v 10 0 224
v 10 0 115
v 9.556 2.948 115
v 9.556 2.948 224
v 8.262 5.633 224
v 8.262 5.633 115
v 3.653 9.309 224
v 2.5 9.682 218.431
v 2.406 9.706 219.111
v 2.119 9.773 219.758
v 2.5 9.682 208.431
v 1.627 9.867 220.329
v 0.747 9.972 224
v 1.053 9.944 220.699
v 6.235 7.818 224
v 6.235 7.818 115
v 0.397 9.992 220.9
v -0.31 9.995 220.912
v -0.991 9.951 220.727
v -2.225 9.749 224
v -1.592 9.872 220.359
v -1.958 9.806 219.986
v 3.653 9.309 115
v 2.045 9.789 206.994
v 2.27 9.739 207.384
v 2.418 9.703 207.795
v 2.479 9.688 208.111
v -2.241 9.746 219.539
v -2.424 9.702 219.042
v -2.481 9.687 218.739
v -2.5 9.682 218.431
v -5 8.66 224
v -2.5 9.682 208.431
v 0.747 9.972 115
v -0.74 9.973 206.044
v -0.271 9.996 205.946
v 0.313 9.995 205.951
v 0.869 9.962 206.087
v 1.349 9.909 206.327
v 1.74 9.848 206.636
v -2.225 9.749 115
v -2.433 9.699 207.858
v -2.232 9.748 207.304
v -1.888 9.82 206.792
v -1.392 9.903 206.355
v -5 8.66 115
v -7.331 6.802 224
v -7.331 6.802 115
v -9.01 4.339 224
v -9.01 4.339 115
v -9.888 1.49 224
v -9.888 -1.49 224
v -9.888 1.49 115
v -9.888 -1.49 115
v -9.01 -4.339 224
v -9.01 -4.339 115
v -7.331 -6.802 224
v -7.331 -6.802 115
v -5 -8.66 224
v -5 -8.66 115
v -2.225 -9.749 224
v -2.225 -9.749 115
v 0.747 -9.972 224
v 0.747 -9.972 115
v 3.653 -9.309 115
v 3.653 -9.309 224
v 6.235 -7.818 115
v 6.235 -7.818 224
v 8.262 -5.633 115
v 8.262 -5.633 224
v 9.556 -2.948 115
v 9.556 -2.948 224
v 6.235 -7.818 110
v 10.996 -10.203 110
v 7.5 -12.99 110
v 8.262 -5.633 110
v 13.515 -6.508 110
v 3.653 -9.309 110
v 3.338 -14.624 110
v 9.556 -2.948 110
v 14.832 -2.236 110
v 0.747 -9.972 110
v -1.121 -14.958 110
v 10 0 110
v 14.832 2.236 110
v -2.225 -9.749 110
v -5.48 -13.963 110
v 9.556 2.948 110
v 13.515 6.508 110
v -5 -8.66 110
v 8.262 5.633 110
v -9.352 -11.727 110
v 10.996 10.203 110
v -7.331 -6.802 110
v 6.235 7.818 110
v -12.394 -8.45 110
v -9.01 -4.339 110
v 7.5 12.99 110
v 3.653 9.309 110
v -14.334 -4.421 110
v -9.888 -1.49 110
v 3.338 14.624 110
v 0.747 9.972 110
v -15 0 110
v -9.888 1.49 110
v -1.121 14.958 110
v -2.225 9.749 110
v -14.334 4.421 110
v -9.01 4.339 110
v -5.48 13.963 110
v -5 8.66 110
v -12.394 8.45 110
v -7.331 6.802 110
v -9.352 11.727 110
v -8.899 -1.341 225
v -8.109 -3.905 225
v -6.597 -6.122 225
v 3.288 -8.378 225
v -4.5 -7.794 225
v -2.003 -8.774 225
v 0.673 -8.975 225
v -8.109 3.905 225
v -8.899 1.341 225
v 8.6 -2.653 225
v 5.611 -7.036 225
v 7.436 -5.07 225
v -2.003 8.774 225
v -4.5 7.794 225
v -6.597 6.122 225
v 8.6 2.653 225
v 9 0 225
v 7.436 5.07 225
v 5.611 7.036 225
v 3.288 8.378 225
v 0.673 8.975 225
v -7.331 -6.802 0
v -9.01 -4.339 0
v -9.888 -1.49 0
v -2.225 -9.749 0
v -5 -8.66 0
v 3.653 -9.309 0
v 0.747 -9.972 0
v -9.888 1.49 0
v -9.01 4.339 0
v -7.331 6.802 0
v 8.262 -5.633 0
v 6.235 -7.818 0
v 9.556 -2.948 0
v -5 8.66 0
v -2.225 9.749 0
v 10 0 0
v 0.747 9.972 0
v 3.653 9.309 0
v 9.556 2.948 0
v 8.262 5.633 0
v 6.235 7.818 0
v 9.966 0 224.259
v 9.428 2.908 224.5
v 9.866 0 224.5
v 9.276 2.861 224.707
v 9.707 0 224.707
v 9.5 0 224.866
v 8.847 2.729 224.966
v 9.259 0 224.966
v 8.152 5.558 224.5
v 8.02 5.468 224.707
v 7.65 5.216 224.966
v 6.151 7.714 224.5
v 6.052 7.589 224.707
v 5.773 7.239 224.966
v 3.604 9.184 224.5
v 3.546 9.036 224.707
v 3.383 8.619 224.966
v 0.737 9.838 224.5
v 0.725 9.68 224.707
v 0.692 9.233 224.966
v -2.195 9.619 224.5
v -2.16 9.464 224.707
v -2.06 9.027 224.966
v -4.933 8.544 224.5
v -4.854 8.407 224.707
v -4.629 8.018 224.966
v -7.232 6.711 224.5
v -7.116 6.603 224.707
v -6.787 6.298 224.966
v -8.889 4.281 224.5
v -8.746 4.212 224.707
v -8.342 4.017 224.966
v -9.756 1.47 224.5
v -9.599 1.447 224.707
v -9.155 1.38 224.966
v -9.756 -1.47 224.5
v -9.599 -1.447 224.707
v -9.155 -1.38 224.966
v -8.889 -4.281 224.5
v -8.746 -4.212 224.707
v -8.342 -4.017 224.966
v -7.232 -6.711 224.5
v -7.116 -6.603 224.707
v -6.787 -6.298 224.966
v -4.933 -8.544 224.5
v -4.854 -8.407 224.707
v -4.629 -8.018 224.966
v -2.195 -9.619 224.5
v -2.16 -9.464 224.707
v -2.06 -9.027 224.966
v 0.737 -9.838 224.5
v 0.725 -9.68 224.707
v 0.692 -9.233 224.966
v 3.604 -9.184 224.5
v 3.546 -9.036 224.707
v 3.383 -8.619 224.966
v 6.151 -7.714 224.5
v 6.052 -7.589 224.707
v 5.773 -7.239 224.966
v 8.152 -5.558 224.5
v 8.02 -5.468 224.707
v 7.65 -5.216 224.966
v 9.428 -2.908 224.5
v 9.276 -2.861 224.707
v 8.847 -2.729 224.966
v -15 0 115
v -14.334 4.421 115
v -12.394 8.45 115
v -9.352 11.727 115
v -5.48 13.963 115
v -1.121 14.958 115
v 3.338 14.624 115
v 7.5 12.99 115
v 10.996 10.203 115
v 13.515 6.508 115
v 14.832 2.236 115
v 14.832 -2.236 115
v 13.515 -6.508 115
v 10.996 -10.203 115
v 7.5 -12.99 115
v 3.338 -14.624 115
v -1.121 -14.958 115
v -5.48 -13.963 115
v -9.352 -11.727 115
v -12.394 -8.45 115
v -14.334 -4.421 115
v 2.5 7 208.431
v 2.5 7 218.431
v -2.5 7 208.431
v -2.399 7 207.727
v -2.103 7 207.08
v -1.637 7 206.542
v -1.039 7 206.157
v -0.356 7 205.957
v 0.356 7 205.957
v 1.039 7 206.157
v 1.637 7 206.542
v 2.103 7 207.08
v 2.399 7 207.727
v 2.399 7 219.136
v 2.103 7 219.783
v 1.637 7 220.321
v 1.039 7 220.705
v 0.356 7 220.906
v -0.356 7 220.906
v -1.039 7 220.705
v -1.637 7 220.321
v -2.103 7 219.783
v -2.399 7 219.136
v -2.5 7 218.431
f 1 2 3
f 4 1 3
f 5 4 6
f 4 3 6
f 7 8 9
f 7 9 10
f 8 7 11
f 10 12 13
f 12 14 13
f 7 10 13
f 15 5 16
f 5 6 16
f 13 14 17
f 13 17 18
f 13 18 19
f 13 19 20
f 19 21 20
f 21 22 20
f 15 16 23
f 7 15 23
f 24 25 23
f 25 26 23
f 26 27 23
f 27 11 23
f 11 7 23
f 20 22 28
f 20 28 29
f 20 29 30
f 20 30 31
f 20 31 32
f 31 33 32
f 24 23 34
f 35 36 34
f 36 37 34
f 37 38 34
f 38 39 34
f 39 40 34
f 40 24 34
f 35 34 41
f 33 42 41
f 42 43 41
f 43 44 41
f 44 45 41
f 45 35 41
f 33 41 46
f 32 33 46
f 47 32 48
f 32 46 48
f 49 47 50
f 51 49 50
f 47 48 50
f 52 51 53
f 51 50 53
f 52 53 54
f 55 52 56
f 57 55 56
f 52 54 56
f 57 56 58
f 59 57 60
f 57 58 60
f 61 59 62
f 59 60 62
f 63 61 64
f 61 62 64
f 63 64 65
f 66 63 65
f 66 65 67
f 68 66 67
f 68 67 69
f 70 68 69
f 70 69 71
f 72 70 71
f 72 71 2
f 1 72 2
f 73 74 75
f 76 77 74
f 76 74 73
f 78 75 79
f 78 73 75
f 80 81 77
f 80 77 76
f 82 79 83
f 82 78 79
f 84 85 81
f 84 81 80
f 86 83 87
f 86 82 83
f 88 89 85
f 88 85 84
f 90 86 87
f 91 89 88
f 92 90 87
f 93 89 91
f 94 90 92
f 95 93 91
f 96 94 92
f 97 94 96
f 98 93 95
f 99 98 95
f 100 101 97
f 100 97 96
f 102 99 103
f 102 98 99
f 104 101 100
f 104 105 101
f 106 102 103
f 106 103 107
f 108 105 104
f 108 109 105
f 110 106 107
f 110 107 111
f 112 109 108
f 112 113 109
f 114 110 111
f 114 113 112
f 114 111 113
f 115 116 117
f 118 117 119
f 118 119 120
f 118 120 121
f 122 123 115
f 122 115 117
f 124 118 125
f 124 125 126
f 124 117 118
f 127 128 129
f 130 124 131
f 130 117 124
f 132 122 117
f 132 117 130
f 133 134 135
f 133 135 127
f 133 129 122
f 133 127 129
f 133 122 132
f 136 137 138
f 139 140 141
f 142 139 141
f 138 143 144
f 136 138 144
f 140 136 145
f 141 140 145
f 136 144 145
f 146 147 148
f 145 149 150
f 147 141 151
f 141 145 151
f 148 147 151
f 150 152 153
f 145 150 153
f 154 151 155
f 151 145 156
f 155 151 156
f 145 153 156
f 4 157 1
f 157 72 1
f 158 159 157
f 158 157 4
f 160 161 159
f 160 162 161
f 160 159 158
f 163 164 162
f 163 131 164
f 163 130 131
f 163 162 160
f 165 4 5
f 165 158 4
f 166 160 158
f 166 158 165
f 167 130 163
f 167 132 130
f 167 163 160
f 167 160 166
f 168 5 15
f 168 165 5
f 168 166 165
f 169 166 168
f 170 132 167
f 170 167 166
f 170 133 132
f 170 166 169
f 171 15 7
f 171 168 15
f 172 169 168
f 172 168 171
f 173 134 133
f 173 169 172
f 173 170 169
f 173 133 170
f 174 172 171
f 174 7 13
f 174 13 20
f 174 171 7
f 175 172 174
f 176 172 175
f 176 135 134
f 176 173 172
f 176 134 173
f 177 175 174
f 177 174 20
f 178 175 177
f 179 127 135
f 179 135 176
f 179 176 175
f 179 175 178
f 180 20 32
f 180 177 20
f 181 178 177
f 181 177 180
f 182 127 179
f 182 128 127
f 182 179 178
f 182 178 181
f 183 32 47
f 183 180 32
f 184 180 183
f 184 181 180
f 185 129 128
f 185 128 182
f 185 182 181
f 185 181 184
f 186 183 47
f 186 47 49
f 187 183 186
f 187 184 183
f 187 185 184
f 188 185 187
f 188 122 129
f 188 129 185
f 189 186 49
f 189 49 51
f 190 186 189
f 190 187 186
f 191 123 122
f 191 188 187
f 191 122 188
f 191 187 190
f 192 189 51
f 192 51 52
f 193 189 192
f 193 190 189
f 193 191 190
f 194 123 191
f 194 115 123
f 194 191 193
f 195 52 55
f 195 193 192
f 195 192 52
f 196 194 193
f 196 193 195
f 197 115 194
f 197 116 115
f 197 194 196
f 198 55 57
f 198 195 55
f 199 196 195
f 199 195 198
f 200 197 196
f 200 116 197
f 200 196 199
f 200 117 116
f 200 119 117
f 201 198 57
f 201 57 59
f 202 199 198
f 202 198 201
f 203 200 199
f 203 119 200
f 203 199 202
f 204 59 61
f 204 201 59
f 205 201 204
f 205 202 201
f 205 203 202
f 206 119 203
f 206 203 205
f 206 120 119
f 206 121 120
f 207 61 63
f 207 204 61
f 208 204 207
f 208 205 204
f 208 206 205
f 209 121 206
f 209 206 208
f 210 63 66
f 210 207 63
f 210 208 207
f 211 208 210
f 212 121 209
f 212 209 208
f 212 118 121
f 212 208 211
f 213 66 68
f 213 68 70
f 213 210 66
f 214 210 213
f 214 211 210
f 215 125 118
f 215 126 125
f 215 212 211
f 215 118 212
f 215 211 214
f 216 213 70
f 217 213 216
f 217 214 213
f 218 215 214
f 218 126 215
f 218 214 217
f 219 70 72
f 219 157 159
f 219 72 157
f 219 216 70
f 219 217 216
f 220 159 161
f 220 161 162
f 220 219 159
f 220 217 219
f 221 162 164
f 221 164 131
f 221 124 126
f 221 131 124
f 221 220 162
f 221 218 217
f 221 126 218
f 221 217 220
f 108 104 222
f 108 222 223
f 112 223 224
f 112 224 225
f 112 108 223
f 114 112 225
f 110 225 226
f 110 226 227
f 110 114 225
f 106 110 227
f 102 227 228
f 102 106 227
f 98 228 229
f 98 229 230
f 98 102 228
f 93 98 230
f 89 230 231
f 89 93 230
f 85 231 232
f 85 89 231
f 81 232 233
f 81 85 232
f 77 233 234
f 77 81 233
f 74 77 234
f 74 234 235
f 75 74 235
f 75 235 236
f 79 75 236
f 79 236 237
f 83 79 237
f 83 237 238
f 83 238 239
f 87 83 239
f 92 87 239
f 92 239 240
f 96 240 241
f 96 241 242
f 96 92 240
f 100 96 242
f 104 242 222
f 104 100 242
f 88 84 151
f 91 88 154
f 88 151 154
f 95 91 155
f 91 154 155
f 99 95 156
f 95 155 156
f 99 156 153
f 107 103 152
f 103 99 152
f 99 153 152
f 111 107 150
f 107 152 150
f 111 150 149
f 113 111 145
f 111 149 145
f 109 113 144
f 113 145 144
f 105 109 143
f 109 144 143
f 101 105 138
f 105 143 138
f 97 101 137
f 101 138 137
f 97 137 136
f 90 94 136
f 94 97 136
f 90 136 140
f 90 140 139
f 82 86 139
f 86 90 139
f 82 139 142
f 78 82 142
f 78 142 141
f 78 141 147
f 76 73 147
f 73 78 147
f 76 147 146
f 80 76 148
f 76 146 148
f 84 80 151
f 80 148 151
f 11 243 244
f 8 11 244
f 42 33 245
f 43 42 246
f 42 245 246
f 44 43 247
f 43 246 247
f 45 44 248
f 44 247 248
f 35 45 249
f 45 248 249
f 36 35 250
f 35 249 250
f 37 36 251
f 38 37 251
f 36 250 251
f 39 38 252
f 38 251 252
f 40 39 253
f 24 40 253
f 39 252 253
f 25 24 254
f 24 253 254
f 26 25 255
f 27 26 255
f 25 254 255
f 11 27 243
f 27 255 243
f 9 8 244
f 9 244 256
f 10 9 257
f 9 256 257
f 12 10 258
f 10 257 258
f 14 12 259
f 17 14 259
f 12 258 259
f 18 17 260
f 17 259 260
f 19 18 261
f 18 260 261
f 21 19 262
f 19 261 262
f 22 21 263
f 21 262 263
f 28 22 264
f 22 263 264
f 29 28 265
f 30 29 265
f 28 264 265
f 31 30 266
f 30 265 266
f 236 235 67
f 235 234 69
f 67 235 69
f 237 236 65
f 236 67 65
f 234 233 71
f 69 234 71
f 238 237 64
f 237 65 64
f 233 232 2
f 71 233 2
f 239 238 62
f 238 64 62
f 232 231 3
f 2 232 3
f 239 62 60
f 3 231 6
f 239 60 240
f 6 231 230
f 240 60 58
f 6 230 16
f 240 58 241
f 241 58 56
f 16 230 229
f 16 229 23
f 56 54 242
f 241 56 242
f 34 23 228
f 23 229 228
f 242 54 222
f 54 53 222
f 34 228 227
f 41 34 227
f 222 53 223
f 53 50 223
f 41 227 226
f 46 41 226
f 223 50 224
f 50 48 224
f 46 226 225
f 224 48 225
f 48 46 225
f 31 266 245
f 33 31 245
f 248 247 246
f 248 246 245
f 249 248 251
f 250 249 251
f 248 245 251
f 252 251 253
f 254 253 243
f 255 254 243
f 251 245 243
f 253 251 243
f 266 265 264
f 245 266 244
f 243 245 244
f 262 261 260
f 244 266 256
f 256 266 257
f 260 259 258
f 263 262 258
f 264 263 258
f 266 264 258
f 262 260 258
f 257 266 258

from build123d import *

# Parameters (mm, degrees)
SKETCH_1_R          = 10
EXTRUDE_1_DEPTH     = 225
SKETCH_2_R          = 15
EXTRUDE_2_DEPTH     = 5
CUT_EXTRUDE_1_DEPTH = 18
FILLET_1_R          = 1


with BuildPart() as part:
    # 草图1 → 凸台-拉伸1 (new body)
    with BuildSketch(Plane.XY):
        Circle(SKETCH_1_R)
    extrude(amount=EXTRUDE_1_DEPTH)

    # 草图2 → 凸台-拉伸2 (add)
    with BuildSketch(Plane(origin=(0, 0, 110), x_dir=(-1, 0, 0), z_dir=(0, 0, -1))):
        Circle(SKETCH_2_R)
    extrude(amount=-EXTRUDE_2_DEPTH)

    # 草图4 → 切除-拉伸1 (cut)
    with BuildSketch(Plane(origin=(0, 7, 0), x_dir=(-1, 0, 0), z_dir=(0, 1, 0))):
        with BuildLine():
            Line((-2.5, 208.431386243), (-2.5, 218.431386243))
            ThreePointArc((-2.5, 218.431386243), (0, 220.931386243), (2.5, 218.431386243))
            Line((2.5, 218.431386243), (2.5, 208.431386243))
            ThreePointArc((2.5, 208.431386243), (0, 205.931386243), (-2.5, 208.431386243))
        make_face()
    extrude(amount=CUT_EXTRUDE_1_DEPTH, mode=Mode.SUBTRACT)

    # 圆角1
    fillet_1_edges = [part.edges().sort_by_distance(p)[0] for p in [
        (-10, 0, 225),
    ]]
    fillet(fillet_1_edges, radius=FILLET_1_R)


solid = part.part
